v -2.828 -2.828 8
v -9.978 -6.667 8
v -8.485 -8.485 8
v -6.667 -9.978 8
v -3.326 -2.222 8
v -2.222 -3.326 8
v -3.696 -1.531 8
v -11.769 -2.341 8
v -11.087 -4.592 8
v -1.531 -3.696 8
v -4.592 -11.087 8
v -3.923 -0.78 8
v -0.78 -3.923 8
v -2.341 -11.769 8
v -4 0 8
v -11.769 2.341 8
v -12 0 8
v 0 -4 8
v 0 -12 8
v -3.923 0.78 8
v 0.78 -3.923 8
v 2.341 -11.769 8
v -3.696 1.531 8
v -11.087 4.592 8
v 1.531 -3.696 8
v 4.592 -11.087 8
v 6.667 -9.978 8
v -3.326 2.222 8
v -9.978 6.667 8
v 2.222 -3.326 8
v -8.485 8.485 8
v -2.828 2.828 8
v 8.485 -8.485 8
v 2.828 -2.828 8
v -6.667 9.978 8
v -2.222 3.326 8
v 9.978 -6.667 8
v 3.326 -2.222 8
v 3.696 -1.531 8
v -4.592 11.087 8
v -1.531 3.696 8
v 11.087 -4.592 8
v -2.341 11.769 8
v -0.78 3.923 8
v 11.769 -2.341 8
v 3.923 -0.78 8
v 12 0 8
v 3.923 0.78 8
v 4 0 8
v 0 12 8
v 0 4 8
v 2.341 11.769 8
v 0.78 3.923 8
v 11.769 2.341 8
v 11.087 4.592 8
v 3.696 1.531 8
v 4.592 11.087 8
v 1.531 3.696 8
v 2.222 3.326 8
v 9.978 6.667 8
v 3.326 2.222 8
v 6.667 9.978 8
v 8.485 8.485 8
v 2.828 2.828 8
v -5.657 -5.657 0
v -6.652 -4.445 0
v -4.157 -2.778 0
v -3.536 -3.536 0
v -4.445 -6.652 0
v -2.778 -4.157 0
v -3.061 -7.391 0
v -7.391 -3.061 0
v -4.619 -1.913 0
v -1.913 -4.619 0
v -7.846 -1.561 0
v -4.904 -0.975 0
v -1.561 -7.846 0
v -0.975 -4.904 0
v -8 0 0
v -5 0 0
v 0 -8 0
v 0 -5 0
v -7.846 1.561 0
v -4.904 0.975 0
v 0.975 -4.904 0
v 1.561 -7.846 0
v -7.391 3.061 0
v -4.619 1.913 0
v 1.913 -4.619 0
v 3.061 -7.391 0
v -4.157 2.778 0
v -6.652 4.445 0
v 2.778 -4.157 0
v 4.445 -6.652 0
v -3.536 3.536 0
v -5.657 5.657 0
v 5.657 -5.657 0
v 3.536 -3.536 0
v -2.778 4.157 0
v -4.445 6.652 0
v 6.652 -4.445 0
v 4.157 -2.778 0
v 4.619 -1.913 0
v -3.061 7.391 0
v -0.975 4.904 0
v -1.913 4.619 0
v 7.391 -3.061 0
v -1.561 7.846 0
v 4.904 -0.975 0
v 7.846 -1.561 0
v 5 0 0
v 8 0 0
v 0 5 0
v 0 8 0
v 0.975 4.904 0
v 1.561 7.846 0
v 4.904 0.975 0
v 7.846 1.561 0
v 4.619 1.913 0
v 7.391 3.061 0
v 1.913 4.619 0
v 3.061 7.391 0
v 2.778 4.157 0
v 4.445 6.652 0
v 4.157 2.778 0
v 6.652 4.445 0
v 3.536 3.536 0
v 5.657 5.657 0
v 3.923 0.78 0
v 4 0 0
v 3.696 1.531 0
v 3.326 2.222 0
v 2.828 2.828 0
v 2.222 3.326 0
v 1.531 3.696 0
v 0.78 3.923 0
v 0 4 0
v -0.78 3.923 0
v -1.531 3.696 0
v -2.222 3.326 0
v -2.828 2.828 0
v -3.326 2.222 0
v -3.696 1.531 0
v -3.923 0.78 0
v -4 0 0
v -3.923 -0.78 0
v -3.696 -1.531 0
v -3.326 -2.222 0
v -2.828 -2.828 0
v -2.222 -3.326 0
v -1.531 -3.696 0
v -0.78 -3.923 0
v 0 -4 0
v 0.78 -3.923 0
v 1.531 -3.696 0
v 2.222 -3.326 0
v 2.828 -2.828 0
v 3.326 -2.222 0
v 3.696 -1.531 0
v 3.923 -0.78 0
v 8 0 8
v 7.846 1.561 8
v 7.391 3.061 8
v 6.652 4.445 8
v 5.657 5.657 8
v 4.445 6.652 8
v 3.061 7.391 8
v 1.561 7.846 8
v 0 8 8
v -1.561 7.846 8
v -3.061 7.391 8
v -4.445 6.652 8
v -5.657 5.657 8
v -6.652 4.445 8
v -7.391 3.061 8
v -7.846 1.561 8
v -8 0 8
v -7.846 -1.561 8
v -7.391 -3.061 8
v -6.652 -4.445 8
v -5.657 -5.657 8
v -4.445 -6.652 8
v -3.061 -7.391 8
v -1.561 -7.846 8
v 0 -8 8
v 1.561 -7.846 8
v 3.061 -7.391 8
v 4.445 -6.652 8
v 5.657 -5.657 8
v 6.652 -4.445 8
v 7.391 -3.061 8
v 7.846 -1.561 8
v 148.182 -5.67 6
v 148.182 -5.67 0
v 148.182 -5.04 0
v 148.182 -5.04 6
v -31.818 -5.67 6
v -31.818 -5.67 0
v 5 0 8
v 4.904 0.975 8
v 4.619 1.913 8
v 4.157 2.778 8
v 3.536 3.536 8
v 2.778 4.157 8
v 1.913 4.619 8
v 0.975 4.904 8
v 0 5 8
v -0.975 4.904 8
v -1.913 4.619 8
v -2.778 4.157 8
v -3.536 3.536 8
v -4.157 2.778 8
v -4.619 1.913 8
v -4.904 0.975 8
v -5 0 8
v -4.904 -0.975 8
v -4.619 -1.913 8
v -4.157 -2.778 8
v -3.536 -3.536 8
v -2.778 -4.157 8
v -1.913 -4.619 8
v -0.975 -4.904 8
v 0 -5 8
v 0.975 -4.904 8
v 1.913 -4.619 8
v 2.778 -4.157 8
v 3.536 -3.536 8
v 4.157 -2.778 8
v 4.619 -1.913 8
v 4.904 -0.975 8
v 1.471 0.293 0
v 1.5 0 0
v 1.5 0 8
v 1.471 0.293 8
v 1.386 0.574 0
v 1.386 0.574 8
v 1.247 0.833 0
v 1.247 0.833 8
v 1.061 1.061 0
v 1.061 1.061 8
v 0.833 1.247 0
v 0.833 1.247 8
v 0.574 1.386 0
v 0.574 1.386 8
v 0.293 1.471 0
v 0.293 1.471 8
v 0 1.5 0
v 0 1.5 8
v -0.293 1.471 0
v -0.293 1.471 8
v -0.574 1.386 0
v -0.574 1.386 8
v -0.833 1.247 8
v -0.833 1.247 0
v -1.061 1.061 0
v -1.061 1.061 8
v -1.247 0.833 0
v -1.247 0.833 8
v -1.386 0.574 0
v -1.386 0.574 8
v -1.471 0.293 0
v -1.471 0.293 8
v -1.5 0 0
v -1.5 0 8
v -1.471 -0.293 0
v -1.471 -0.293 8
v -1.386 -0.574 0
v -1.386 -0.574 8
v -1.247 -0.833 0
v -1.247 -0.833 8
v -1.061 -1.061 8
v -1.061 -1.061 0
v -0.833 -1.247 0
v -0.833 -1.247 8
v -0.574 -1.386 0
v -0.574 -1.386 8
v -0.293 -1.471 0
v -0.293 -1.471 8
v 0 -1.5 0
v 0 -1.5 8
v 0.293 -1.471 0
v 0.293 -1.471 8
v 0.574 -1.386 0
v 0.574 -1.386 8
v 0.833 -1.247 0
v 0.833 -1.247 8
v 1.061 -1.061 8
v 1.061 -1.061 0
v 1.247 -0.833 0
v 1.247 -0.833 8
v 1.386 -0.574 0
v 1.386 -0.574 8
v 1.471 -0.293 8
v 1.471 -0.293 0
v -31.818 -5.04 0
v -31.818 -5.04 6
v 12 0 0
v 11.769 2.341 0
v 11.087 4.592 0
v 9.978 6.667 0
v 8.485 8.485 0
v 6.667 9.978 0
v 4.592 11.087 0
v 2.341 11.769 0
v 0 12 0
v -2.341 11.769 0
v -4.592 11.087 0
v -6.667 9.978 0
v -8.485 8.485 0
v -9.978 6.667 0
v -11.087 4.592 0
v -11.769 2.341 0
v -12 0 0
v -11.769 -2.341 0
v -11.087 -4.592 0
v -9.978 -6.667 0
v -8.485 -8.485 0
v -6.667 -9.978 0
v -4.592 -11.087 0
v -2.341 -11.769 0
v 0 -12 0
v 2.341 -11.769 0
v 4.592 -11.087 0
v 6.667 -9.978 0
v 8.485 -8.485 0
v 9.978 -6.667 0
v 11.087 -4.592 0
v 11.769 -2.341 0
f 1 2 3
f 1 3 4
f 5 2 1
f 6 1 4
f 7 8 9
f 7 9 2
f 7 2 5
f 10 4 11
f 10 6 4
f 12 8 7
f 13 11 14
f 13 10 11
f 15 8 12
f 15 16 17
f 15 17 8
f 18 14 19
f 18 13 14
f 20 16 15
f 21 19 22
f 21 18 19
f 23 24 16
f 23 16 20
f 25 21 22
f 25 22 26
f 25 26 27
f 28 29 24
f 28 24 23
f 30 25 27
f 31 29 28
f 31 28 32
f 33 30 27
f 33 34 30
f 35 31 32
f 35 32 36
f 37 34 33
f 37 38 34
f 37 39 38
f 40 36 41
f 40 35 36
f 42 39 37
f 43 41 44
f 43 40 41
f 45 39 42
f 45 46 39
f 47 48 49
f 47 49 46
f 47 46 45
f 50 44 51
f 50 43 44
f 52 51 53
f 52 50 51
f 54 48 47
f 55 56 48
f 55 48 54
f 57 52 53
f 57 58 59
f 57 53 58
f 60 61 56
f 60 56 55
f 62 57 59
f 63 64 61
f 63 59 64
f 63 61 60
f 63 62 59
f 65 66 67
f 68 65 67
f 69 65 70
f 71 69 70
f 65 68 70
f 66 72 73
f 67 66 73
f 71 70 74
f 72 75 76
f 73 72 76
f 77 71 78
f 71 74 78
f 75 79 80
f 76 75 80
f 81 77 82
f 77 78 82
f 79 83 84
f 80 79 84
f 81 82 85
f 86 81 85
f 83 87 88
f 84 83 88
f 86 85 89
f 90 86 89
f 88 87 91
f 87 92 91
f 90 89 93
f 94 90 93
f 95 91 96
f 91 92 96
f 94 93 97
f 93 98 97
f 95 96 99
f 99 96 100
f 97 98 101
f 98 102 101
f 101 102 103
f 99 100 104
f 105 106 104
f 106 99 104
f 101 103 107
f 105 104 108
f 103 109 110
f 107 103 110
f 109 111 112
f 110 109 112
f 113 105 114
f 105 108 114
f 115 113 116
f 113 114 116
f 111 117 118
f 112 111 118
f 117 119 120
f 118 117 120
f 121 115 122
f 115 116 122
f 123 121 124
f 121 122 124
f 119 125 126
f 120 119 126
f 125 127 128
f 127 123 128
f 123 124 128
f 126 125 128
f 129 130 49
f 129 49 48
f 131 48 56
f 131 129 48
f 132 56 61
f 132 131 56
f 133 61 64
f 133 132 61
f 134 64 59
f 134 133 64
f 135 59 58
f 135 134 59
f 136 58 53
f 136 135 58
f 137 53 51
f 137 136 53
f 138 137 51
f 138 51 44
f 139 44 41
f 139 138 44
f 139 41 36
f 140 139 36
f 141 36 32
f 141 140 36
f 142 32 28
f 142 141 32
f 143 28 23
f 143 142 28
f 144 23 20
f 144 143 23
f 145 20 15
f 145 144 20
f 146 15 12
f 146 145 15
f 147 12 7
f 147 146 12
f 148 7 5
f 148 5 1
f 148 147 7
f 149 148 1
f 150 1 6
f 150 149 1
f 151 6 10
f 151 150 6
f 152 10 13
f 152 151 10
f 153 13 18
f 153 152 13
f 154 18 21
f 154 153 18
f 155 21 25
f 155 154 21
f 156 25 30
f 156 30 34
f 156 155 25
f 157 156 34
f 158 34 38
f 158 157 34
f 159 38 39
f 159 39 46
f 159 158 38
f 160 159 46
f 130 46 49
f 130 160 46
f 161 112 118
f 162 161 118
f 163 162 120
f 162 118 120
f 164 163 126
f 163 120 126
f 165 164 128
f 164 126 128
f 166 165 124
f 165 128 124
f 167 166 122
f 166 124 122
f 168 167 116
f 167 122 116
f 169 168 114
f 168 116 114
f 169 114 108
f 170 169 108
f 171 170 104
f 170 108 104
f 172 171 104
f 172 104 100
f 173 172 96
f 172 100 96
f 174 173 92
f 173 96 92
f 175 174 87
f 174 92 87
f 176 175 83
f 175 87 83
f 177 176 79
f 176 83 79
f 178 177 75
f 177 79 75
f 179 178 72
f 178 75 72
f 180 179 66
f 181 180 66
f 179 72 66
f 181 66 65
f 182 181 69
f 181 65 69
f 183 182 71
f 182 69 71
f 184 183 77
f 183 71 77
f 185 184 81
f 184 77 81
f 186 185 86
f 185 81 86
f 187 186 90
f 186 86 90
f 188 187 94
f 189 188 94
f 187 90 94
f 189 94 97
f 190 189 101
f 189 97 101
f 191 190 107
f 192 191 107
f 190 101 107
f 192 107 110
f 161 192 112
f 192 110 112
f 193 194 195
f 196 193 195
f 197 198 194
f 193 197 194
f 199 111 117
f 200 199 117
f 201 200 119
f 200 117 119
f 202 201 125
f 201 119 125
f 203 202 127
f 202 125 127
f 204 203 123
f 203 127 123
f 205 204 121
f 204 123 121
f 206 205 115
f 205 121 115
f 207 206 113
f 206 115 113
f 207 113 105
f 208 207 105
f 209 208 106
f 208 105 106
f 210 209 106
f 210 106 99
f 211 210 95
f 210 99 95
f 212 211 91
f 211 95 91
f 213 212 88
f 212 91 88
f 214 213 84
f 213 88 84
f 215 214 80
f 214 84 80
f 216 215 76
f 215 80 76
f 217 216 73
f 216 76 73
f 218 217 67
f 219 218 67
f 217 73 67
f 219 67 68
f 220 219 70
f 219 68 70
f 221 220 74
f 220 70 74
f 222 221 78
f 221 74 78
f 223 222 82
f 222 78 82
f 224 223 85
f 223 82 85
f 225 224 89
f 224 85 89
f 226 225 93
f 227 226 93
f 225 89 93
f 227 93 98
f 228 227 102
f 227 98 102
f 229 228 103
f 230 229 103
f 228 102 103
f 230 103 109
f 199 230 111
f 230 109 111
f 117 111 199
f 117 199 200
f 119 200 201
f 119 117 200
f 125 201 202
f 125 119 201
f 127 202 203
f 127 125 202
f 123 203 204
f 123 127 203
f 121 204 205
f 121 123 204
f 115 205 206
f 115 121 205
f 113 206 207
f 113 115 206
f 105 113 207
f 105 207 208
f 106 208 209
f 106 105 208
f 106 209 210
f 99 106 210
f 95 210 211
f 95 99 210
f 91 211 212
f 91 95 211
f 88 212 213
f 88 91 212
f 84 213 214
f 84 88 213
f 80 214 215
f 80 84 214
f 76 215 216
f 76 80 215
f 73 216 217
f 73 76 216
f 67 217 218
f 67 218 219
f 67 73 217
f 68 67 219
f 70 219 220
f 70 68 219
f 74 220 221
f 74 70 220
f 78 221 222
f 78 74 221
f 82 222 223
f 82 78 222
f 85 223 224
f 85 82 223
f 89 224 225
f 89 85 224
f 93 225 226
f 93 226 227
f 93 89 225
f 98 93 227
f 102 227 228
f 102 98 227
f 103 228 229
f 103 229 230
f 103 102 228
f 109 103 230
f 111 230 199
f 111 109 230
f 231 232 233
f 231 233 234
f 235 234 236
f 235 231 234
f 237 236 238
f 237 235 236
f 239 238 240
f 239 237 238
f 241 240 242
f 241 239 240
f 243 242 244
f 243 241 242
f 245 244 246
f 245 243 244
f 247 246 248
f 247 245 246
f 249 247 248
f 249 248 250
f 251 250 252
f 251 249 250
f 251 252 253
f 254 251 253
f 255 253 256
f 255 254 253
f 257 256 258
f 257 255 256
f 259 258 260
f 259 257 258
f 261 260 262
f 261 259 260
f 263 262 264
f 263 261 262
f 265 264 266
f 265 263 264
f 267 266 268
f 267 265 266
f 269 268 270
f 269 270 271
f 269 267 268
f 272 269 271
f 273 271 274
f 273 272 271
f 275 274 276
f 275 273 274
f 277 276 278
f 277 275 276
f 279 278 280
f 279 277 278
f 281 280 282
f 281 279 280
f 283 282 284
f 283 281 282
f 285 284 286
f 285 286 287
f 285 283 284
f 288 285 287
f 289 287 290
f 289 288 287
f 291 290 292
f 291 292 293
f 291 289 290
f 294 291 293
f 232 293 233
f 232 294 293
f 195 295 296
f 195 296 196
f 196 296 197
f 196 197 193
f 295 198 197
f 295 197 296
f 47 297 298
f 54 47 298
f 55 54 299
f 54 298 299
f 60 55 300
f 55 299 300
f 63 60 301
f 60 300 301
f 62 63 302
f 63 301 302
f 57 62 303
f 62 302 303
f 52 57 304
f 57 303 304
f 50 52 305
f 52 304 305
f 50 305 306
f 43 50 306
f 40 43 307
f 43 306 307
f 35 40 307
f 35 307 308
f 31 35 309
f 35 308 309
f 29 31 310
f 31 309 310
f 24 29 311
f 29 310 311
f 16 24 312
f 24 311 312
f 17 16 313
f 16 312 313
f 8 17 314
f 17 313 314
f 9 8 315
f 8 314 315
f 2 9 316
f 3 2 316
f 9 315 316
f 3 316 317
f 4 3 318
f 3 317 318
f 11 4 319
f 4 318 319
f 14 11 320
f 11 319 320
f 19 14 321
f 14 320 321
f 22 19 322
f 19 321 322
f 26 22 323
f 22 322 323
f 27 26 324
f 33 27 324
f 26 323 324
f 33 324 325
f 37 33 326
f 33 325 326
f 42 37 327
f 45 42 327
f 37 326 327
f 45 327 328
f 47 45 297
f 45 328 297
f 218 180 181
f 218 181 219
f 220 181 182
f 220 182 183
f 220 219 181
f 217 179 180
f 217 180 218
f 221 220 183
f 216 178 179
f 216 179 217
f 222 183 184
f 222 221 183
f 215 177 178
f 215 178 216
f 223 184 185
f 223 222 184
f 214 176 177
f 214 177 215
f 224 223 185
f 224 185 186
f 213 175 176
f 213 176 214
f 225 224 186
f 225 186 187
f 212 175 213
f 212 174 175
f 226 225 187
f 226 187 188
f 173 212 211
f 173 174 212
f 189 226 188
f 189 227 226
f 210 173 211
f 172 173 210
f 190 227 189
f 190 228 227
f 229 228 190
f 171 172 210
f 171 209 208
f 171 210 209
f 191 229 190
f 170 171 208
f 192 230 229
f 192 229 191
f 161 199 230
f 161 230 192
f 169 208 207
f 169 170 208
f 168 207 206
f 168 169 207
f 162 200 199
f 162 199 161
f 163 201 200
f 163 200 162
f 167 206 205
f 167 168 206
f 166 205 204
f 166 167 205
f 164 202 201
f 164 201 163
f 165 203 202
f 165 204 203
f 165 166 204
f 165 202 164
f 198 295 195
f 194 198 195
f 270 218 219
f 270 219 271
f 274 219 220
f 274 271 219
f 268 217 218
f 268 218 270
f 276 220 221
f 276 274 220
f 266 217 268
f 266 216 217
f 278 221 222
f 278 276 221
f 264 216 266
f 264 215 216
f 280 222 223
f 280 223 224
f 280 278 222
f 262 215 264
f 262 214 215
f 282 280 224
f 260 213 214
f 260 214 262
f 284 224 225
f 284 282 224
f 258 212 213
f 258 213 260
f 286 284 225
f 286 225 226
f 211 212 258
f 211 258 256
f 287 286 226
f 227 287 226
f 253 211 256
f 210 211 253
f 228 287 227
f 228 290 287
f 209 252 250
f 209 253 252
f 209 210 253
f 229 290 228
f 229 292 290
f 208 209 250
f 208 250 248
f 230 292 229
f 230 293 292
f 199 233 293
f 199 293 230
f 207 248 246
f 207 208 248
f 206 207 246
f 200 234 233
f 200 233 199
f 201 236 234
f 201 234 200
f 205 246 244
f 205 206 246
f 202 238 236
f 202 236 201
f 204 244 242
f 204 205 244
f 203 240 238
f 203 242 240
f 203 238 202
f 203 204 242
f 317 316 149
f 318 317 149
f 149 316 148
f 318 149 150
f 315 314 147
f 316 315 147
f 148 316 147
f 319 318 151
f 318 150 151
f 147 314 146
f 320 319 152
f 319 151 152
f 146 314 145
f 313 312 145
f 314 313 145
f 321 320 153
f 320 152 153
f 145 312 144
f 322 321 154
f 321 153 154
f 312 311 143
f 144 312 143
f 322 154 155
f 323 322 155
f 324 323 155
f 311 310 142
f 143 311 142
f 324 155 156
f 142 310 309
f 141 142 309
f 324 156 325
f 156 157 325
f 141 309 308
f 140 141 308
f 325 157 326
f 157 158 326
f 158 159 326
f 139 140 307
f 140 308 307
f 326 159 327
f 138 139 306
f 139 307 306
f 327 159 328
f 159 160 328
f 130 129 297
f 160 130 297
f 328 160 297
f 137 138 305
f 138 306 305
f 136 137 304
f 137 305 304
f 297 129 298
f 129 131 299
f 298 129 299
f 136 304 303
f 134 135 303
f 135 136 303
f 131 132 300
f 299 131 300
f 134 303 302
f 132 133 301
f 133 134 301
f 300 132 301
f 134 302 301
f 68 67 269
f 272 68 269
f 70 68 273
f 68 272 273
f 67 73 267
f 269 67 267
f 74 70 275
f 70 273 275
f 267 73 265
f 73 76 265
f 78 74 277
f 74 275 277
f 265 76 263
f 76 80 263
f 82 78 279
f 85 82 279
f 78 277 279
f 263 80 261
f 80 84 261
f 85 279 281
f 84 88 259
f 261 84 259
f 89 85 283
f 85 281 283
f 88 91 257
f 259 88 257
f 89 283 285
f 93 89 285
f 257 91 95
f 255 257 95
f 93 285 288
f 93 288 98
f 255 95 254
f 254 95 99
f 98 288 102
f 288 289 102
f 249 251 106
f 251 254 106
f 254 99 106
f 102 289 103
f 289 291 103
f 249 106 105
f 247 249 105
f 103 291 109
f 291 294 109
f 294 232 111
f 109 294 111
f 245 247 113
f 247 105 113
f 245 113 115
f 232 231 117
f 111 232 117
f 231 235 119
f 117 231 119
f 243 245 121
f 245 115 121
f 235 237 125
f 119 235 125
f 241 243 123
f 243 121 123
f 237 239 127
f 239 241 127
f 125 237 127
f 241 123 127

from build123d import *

# Parameters (mm, degrees)
F0_R     = 5
F0_R_2   = 1.5
F1_DEPTH = 8
F2_R     = 8
F2_R_2   = 5
F3_DEPTH = 8
F4_R     = 12
F4_R_2   = 4
F5_DEPTH = 8
F6_W     = 180
F6_H     = 0.63
F7_DEPTH = 6


with BuildPart() as f1:
    # F0 (on Top) → F1 (new body)
    with BuildSketch(Plane.XY):
        Circle(F0_R)
        Circle(F0_R_2, mode=Mode.SUBTRACT)
    extrude(amount=F1_DEPTH)


with BuildPart() as f3:
    # F2 (on Top) → F3 (new body)
    with BuildSketch(Plane.XY):
        Circle(F2_R)
        Circle(F2_R_2, mode=Mode.SUBTRACT)
    extrude(amount=F3_DEPTH)


with BuildPart() as f5:
    # F4 (on Top) → F5 (new body)
    with BuildSketch(Plane.XY):
        Circle(F4_R)
        Circle(F4_R_2, mode=Mode.SUBTRACT)
    extrude(amount=F5_DEPTH)


with BuildPart() as f7:
    # F6 (on Top) → F7 (new body)
    with BuildSketch(Plane.XY):
        with Locations((58.182056, -5.354627)):
            Rectangle(F6_W, F6_H)
    extrude(amount=F7_DEPTH)


solid = Compound([f1.part, f3.part, f5.part, f7.part])
